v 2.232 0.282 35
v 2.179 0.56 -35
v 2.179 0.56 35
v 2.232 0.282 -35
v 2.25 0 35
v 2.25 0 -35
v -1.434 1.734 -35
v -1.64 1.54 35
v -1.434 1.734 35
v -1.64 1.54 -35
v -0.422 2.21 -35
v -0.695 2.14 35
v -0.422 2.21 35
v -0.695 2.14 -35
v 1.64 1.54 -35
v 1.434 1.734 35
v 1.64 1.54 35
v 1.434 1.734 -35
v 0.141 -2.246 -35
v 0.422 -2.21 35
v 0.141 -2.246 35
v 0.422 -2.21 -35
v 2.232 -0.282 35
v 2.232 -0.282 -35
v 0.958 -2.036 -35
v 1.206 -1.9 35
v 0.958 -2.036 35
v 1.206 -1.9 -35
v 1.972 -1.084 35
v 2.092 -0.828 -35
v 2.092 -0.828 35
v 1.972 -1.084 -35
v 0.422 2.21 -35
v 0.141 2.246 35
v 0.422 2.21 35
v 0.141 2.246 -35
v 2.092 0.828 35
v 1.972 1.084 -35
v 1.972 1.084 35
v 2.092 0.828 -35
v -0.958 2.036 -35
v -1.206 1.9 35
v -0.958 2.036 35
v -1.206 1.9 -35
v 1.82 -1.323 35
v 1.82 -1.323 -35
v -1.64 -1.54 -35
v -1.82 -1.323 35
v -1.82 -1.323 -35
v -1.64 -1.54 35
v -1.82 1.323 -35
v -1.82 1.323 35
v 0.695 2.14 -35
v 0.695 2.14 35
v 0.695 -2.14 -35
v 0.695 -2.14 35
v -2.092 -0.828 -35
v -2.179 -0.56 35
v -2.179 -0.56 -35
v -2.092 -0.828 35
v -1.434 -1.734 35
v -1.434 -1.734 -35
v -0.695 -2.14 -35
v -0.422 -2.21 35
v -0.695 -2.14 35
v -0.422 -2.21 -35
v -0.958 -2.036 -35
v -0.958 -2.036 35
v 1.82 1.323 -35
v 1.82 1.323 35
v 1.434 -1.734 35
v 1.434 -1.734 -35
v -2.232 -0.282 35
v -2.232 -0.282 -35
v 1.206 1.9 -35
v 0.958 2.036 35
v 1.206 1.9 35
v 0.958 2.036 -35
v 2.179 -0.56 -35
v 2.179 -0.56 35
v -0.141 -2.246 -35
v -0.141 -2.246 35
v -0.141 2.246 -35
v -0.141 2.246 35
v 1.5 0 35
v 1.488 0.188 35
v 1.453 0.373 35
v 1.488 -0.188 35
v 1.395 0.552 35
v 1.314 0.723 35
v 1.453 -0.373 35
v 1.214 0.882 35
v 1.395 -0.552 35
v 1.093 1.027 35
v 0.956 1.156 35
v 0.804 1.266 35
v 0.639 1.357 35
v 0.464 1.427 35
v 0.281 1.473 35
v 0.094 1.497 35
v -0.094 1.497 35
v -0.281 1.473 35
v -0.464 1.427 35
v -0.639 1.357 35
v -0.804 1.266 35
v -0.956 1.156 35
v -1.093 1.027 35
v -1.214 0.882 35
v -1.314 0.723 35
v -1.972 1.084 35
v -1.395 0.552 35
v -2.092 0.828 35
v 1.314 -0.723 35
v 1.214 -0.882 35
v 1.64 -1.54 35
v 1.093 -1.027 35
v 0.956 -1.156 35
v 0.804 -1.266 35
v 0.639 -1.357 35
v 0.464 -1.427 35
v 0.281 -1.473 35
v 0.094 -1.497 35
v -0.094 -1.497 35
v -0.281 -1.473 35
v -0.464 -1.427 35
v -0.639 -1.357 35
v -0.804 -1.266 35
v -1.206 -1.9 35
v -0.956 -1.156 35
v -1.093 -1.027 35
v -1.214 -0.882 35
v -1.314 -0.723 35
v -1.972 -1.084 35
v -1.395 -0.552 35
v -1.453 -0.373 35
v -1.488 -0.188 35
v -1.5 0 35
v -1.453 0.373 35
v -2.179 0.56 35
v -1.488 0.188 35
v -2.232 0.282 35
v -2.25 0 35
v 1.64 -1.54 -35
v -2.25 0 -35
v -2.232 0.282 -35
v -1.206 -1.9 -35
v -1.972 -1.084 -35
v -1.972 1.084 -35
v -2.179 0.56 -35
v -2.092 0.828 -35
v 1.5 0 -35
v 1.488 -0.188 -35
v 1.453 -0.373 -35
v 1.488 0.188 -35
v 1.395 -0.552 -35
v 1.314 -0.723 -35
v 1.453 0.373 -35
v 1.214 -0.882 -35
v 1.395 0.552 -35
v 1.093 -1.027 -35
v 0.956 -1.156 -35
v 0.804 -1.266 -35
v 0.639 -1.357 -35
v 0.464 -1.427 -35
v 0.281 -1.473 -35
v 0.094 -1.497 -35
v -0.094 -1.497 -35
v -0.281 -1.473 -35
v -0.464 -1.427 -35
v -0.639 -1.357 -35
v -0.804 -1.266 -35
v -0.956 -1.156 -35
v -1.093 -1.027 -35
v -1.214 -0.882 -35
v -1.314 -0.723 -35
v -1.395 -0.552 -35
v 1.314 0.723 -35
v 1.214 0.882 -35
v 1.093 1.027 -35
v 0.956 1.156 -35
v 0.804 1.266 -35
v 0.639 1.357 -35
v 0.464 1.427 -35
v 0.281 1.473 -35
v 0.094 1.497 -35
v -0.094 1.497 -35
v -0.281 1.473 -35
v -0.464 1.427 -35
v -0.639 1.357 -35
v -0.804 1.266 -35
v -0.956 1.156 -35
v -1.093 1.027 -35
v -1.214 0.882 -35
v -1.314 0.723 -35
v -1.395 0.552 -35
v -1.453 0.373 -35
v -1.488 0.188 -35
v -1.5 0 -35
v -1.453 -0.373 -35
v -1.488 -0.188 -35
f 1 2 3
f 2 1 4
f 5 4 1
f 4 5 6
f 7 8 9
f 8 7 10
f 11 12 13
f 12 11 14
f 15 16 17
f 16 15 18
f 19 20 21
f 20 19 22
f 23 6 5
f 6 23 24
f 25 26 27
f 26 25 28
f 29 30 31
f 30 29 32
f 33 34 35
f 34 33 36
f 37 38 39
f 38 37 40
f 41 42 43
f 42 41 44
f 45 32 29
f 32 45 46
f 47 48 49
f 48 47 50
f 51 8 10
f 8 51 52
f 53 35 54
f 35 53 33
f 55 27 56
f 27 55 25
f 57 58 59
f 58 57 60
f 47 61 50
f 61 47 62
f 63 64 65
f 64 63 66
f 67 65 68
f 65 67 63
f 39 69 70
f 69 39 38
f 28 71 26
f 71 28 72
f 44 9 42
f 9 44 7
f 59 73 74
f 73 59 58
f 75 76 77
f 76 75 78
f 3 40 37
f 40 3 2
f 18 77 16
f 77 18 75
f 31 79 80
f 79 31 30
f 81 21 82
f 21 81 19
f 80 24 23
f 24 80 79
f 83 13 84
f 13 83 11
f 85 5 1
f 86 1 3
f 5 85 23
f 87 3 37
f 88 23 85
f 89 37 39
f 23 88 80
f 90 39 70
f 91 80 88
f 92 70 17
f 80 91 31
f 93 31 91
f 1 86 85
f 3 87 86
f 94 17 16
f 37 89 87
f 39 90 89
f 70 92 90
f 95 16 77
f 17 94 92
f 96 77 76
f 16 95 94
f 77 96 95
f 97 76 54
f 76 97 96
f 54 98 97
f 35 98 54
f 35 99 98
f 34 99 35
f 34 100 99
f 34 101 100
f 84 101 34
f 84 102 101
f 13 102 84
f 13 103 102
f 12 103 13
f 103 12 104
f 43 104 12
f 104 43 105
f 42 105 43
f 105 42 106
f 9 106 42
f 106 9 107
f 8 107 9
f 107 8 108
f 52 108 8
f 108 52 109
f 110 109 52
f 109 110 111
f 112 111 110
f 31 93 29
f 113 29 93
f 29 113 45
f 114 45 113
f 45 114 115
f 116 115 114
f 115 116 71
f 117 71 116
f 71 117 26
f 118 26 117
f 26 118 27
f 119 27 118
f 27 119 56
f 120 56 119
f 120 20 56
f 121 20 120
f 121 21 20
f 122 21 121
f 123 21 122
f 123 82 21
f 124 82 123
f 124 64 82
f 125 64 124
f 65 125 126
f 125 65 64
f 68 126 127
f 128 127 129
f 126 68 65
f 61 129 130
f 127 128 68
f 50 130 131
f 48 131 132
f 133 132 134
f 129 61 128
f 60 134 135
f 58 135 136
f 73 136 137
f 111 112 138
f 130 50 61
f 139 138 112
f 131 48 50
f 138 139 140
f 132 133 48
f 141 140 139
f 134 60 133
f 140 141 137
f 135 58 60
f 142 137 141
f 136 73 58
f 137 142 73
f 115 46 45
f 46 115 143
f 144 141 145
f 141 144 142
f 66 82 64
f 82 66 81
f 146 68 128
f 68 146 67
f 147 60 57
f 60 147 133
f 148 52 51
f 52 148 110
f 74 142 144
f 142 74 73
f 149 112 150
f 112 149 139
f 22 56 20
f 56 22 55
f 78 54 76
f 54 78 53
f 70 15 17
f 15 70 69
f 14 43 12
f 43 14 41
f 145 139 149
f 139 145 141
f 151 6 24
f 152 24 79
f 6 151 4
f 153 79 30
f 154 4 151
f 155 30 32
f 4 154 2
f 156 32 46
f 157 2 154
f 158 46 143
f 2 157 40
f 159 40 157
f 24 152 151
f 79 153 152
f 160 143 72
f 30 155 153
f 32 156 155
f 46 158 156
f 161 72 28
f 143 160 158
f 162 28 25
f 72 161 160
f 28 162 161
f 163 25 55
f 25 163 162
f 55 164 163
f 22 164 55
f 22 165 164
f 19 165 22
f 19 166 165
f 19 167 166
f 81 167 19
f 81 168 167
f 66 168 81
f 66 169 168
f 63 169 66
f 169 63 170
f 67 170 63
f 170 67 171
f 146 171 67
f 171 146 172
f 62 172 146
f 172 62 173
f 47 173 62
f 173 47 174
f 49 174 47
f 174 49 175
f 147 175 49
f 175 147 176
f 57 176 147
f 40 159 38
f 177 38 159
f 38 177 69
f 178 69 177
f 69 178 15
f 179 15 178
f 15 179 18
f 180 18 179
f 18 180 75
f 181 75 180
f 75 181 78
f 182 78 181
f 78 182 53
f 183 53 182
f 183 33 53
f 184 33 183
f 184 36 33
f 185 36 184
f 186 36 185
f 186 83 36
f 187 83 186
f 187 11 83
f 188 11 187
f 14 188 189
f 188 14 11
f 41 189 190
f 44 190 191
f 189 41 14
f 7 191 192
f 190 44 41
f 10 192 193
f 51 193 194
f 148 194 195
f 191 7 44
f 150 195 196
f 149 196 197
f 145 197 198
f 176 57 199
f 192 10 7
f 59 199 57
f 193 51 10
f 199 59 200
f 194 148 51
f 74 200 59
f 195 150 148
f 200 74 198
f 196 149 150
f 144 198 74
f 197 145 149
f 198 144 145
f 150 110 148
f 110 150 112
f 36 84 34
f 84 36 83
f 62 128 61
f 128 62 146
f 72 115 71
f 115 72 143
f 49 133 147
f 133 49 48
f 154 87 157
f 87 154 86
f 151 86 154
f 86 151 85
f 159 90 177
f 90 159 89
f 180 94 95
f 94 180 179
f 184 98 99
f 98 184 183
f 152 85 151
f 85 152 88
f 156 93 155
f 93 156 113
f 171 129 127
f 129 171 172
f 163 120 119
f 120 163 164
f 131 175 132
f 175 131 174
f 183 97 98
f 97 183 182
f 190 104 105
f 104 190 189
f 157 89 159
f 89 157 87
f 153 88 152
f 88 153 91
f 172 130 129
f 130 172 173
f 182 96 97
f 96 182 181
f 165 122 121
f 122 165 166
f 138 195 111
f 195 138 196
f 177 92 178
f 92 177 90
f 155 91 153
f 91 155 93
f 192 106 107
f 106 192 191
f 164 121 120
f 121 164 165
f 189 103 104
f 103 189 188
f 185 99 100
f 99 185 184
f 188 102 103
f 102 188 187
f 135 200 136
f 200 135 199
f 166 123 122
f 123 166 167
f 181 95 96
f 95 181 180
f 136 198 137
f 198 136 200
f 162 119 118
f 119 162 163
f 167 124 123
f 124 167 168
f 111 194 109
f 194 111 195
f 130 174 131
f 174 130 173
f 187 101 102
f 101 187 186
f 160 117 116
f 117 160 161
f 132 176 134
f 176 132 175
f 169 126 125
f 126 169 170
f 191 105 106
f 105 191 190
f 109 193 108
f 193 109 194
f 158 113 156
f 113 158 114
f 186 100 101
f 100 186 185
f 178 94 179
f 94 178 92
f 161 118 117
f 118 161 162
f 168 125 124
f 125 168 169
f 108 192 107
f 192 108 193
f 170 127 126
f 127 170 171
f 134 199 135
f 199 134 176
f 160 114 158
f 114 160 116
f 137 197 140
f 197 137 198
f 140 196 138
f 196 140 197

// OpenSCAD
$fn = 50;


difference() {
	union() {
		translate(v = [0, 0, -35.0000000000]) {
			cylinder(h = 70, r = 2.2500000000);
		}
	}
	union() {
		translate(v = [0, 0, -100.0000000000]) {
			cylinder(h = 200, r = 1.5000000000);
		}
	}
}
